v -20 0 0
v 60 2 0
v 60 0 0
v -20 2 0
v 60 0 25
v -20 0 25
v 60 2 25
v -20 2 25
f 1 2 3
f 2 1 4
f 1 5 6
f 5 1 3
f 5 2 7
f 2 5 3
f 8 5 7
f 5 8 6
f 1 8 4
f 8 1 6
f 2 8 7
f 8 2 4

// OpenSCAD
// file: CMSL.scad
/*
CMSL - The chrissx Media SCAD library
Copyright 2021 chrissx Media, Chris Häußler
For licensing information please refer to the 2nd version of the
GNU General Public License, as found in the repository you should have
obtained this file from, at https://github.com/chrissxYT/models.
*/

module CMMultiLineText(lines = [], size = 10, font = "Liberation Mono",
                       halign = "left", valign = "baseline",
                       direction = "ltr", hspace = 1, vspace = 3) {
  translate([0, -size, 0]) {
    for (i = [0 : len(lines) - 1]) {
      translate([0 , (-i - 0.5) * vspace, 0]) {
        text(text=lines[i], size=size, font=font, valign=valign, halign=halign,
             direction=direction, spacing=hspace);
      }
    }
  }
}

module CMBox(width=50, height=37.5, wall=1, fronttext=[],
             textsize=1.5, font="Liberation Mono", textdepth=1.5) {
  inner = width - wall * 2;
  union() {
    difference() {
      cube([width, width, height]);
      translate([wall, wall, wall]) {
        cube([inner, inner, height+1]);
      }
    }
    translate([wall, 0, height-wall]) {
      rotate([90, 0, 0]) {
        linear_extrude(textdepth) {
          CMMultiLineText(fronttext, size=textsize, vspace=textsize, font=font);
        }
      }
    }
  }
}
// main file
/// A mount for a ¼" audio jack, held in place by something like a headphone
/// holder. Currently used below my booth.
use <CMSL.scad>;
$fn = 100;
// https://cdn-reichelt.de/documents/datenblatt/C160/S2_ENG_DATASHEET.pdf

difference() {
  CMBox([40, 40, 25], wall=2, fronttext=[]);
  translate([20, 20, 0])
    cylinder(2, d=11.11);
}
translate([-20, 0, 0])
  cube([80, 2, 25]);
